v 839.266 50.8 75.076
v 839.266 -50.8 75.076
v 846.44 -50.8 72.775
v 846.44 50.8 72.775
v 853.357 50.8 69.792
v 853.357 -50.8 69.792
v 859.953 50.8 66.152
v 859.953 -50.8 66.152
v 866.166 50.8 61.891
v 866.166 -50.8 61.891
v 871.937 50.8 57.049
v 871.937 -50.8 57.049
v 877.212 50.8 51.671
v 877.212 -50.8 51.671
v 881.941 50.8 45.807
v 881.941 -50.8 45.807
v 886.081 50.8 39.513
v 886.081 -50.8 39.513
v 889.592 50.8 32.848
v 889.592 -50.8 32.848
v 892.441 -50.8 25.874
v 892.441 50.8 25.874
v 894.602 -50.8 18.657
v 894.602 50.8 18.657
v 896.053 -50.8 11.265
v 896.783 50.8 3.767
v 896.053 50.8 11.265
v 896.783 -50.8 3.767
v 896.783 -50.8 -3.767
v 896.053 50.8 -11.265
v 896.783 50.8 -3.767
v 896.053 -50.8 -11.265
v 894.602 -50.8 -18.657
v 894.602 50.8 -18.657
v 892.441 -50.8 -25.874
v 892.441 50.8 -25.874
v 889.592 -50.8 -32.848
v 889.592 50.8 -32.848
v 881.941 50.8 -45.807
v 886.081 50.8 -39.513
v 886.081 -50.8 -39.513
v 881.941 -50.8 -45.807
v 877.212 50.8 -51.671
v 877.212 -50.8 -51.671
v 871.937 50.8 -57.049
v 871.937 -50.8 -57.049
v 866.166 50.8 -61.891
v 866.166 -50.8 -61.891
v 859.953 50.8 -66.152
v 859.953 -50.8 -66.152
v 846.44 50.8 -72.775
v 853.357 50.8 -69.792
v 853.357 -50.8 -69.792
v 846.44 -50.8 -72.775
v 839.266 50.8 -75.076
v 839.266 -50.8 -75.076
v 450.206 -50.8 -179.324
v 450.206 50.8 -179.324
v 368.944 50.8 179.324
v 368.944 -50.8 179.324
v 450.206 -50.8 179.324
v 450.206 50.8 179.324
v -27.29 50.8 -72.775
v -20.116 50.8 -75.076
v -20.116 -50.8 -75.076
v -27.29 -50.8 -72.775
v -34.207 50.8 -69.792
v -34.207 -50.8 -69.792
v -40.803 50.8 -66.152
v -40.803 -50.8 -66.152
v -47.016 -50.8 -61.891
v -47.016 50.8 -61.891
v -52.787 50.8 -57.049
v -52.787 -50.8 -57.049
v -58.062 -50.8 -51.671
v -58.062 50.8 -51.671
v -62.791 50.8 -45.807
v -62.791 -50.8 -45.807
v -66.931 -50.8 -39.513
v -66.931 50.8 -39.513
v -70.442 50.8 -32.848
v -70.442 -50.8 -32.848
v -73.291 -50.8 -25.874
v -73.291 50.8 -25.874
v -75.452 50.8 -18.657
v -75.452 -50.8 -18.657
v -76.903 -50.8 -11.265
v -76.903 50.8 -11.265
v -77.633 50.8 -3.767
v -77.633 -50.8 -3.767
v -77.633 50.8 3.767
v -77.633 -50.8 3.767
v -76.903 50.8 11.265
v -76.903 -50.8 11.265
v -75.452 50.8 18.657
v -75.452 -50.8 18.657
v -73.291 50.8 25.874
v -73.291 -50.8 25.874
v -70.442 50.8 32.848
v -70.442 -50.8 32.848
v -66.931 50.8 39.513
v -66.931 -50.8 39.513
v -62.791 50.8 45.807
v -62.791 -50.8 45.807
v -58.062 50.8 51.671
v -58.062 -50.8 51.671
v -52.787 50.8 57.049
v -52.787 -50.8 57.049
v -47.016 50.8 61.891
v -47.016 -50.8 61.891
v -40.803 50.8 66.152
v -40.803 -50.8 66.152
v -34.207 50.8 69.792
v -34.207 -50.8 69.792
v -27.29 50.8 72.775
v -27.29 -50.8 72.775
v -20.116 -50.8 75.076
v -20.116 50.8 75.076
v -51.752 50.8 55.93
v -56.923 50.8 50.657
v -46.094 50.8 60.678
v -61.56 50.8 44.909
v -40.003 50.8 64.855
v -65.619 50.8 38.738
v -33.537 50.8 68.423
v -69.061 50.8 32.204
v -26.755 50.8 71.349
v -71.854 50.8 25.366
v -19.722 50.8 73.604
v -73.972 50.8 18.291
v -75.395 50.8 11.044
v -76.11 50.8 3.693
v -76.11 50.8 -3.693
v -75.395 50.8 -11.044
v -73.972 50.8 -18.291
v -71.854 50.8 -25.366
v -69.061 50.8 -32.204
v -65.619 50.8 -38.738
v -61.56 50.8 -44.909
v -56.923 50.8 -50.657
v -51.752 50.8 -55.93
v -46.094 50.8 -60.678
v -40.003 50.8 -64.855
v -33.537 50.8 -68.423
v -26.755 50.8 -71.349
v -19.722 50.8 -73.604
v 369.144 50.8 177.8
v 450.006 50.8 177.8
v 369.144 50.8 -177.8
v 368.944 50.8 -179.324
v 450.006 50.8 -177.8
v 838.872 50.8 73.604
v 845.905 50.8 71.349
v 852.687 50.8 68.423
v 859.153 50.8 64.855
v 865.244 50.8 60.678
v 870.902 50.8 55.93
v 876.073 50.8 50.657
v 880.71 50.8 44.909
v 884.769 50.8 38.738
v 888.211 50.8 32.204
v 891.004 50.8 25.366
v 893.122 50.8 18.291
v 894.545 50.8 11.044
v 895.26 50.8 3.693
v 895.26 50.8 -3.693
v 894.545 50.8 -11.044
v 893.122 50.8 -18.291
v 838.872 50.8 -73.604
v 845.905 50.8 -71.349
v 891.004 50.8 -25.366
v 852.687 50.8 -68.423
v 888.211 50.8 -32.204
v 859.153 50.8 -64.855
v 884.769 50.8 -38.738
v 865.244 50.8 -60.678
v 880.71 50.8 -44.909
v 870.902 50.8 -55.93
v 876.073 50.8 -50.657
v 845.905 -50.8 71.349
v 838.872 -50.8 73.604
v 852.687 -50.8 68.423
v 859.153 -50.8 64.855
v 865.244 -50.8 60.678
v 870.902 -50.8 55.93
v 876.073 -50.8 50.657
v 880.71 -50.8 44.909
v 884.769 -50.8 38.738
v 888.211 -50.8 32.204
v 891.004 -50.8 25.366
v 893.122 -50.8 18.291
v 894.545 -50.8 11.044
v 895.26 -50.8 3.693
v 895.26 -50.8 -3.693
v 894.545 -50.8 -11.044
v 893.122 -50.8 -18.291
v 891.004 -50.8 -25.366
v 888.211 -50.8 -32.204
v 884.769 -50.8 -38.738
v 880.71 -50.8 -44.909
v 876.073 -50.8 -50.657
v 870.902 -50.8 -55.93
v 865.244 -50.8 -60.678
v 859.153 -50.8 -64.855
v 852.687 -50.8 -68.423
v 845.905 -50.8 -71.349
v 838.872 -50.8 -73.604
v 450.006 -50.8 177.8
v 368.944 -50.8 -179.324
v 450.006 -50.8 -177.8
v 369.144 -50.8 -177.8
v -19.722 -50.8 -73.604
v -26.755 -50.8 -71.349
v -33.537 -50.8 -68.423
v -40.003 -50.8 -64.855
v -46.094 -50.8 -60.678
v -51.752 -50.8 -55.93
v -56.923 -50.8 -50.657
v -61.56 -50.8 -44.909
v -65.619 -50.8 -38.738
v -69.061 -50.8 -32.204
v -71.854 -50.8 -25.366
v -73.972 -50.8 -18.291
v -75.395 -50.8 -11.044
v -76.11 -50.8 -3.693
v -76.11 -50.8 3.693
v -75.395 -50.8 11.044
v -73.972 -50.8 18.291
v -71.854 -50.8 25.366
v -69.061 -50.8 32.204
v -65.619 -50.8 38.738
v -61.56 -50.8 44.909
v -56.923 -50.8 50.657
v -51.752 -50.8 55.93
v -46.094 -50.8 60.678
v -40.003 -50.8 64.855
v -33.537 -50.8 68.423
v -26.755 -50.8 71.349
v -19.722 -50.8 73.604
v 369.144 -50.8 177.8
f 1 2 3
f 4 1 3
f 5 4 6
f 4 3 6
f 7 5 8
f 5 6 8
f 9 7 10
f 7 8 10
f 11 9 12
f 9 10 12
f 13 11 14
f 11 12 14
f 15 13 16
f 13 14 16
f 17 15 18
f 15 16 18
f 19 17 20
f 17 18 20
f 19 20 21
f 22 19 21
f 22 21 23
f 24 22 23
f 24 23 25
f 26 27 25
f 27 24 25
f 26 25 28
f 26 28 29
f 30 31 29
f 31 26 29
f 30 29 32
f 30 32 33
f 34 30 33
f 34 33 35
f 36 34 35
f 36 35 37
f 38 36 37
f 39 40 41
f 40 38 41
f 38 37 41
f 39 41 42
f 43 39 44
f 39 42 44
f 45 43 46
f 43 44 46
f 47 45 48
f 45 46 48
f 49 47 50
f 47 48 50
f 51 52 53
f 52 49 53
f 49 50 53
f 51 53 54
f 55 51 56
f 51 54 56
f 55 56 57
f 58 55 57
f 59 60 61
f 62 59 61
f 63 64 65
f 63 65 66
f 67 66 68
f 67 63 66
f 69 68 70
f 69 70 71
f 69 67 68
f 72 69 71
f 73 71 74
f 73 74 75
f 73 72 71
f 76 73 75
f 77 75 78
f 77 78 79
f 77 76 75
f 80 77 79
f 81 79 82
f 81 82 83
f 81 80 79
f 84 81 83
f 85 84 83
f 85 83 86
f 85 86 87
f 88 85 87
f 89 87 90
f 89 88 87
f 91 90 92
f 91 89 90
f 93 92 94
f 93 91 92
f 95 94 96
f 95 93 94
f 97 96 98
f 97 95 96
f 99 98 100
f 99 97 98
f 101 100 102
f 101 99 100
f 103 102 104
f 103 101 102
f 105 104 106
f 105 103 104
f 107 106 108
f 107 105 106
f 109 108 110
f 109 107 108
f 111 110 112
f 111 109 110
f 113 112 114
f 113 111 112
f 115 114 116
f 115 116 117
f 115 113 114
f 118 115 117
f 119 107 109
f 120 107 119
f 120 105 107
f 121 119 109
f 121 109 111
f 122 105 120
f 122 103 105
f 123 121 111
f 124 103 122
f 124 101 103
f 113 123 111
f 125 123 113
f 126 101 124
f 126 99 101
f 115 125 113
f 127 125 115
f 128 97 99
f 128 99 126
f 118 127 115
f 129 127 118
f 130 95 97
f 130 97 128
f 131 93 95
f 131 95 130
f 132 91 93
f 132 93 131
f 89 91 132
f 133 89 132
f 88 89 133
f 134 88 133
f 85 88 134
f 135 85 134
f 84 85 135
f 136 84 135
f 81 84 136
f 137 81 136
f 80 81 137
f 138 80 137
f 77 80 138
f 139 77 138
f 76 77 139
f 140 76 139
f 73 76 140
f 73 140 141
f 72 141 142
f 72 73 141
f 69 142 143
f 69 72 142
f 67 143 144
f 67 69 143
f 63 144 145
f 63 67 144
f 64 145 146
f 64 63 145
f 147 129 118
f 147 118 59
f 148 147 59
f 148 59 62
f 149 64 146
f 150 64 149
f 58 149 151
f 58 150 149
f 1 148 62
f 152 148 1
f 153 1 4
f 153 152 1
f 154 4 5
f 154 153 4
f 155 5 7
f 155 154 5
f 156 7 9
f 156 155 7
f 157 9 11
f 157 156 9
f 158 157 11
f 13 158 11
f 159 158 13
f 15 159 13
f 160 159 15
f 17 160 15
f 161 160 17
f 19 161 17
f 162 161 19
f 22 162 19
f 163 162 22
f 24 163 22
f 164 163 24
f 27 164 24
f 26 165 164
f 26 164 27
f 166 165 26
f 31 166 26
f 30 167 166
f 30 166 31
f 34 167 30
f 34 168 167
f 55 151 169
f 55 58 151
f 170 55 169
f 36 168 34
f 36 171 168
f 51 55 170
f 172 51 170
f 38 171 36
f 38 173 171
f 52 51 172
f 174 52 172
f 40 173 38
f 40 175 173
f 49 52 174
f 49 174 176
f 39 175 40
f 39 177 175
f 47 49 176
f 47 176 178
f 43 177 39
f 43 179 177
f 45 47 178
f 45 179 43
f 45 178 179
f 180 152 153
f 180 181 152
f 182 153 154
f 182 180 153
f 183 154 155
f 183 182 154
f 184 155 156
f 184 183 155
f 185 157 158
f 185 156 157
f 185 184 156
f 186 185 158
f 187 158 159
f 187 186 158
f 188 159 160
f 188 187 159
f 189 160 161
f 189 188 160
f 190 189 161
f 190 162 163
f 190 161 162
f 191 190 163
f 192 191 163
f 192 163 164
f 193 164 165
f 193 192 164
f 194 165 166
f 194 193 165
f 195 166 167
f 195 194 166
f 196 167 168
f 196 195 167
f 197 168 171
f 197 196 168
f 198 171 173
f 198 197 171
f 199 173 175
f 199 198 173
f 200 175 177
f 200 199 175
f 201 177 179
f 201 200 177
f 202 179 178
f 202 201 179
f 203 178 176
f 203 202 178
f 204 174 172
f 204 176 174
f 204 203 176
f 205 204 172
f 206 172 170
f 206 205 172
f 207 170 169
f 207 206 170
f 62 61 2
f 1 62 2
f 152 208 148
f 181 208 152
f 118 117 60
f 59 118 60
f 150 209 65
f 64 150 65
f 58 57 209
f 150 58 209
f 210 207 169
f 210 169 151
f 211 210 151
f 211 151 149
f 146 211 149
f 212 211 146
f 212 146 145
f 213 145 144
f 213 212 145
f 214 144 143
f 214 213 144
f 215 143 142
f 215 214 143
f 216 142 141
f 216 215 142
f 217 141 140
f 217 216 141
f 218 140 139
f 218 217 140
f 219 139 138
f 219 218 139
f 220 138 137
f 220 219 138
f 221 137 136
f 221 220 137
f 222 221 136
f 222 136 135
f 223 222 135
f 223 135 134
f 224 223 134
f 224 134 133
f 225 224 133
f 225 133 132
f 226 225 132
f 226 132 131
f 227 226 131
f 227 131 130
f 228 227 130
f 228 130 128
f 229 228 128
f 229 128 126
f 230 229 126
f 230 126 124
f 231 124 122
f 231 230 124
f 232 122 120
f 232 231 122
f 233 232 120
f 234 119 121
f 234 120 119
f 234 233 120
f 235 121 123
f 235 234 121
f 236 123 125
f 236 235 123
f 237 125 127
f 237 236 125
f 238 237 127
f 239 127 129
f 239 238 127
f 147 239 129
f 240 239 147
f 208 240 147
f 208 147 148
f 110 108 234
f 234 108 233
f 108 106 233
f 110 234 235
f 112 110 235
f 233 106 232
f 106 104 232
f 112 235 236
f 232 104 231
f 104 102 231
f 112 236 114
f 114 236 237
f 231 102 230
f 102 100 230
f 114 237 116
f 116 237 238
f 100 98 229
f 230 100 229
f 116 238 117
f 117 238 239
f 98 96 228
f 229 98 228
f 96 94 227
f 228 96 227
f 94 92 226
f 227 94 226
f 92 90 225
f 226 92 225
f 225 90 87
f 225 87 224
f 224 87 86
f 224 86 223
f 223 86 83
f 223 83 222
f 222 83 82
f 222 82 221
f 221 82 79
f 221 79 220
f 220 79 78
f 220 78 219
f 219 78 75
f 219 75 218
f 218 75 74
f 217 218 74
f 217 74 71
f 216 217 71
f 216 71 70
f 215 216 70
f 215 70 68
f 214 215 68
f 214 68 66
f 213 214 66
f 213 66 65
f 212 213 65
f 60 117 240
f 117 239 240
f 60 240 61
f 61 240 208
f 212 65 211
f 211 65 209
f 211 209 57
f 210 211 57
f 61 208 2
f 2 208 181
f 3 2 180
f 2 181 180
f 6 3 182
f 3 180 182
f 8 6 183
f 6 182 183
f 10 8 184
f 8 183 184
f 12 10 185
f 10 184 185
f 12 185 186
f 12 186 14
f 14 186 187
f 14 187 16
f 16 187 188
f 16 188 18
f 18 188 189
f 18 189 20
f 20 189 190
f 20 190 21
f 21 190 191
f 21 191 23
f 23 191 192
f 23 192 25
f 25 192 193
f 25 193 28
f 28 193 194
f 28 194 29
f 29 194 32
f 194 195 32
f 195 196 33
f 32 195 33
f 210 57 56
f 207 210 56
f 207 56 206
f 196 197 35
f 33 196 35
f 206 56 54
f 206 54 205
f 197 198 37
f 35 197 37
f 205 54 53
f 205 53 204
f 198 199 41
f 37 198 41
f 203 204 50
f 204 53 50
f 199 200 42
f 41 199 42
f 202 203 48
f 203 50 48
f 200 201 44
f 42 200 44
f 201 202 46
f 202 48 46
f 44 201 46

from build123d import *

# Parameters (mm, degrees)
SKETCH1_R           = 77.724
BOSS_EXTRUDE1_DEPTH = 50.8
BOSS_EXTRUDE2_START = -50.8
BOSS_EXTRUDE2_DEPTH = 101.6
BOSS_EXTRUDE3_START = -50.8
SKETCH3_R           = 77.724
BOSS_EXTRUDE3_DEPTH = 101.6
CUT_EXTRUDE2_START  = -50.8
CUT_EXTRUDE2_DEPTH  = 967.835320745
CUT_EXTRUDE4_START  = -50.8
SKETCH5_R           = 76.2
CUT_EXTRUDE4_DEPTH  = 967.835320745
CUT_EXTRUDE6_START  = -50.8
SKETCH6_R           = 76.2
CUT_EXTRUDE6_DEPTH  = 967.835320745


with BuildPart() as part:
    # Sketch1 → Boss-Extrude1 (new, symmetric)
    with BuildSketch(Plane(origin=(0, 0, 0), x_dir=(1, 0, 0), z_dir=(0, 1, 0))):
        with Locations(Location((0, 0, 0), (0, 0, 270))):
            Circle(SKETCH1_R)
    extrude(amount=BOSS_EXTRUDE1_DEPTH, both=True)

    # Sketch2 → Boss-Extrude2 (add)
    with BuildSketch(Plane(origin=(0, 0, 0), x_dir=(1, 0, 0), z_dir=(0, 1, 0)).offset(BOSS_EXTRUDE2_START)):
        Polygon((-20.116451462, -75.075618922), (368.943803327, -179.324), (450.206196673, -179.324), (839.266451462, -75.075618922), (839.266451462, 75.075618922), (450.206196673, 179.324), (368.943803327, 179.324), (-20.116451462, 75.075618922), align=None)
    extrude(amount=BOSS_EXTRUDE2_DEPTH)

    # Sketch3 → Boss-Extrude3 (add)
    with BuildSketch(Plane(origin=(0, 0, 0), x_dir=(1, 0, 0), z_dir=(0, 1, 0)).offset(BOSS_EXTRUDE3_START)):
        with Locations((819.15, 0)):
            Circle(SKETCH3_R)
    extrude(amount=BOSS_EXTRUDE3_DEPTH)

    # Sketch4 → Cut-Extrude2 (cut, through all)
    with BuildSketch(Plane(origin=(0, 0, 0), x_dir=(1, 0, 0), z_dir=(0, 1, 0)).offset(CUT_EXTRUDE2_START)):
        Polygon((-19.722011237, -73.603547963), (369.144441733, -177.8), (450.005558267, -177.8), (838.872011237, -73.603547963), (838.872011237, 73.603547963), (450.005558267, 177.8), (369.144441733, 177.8), (-19.722011237, 73.603547963), align=None)
    extrude(amount=CUT_EXTRUDE2_DEPTH, mode=Mode.SUBTRACT)

    # Sketch5 → Cut-Extrude4 (cut, through all)
    with BuildSketch(Plane(origin=(0, 0, 0), x_dir=(1, 0, 0), z_dir=(0, 1, 0)).offset(CUT_EXTRUDE4_START)):
        Circle(SKETCH5_R)
    extrude(amount=CUT_EXTRUDE4_DEPTH, mode=Mode.SUBTRACT)

    # Sketch6 → Cut-Extrude6 (cut, through all)
    with BuildSketch(Plane(origin=(0, 0, 0), x_dir=(1, 0, 0), z_dir=(0, 1, 0)).offset(CUT_EXTRUDE6_START)):
        with Locations((819.15, 0)):
            Circle(SKETCH6_R)
    extrude(amount=CUT_EXTRUDE6_DEPTH, mode=Mode.SUBTRACT)


solid = part.part
